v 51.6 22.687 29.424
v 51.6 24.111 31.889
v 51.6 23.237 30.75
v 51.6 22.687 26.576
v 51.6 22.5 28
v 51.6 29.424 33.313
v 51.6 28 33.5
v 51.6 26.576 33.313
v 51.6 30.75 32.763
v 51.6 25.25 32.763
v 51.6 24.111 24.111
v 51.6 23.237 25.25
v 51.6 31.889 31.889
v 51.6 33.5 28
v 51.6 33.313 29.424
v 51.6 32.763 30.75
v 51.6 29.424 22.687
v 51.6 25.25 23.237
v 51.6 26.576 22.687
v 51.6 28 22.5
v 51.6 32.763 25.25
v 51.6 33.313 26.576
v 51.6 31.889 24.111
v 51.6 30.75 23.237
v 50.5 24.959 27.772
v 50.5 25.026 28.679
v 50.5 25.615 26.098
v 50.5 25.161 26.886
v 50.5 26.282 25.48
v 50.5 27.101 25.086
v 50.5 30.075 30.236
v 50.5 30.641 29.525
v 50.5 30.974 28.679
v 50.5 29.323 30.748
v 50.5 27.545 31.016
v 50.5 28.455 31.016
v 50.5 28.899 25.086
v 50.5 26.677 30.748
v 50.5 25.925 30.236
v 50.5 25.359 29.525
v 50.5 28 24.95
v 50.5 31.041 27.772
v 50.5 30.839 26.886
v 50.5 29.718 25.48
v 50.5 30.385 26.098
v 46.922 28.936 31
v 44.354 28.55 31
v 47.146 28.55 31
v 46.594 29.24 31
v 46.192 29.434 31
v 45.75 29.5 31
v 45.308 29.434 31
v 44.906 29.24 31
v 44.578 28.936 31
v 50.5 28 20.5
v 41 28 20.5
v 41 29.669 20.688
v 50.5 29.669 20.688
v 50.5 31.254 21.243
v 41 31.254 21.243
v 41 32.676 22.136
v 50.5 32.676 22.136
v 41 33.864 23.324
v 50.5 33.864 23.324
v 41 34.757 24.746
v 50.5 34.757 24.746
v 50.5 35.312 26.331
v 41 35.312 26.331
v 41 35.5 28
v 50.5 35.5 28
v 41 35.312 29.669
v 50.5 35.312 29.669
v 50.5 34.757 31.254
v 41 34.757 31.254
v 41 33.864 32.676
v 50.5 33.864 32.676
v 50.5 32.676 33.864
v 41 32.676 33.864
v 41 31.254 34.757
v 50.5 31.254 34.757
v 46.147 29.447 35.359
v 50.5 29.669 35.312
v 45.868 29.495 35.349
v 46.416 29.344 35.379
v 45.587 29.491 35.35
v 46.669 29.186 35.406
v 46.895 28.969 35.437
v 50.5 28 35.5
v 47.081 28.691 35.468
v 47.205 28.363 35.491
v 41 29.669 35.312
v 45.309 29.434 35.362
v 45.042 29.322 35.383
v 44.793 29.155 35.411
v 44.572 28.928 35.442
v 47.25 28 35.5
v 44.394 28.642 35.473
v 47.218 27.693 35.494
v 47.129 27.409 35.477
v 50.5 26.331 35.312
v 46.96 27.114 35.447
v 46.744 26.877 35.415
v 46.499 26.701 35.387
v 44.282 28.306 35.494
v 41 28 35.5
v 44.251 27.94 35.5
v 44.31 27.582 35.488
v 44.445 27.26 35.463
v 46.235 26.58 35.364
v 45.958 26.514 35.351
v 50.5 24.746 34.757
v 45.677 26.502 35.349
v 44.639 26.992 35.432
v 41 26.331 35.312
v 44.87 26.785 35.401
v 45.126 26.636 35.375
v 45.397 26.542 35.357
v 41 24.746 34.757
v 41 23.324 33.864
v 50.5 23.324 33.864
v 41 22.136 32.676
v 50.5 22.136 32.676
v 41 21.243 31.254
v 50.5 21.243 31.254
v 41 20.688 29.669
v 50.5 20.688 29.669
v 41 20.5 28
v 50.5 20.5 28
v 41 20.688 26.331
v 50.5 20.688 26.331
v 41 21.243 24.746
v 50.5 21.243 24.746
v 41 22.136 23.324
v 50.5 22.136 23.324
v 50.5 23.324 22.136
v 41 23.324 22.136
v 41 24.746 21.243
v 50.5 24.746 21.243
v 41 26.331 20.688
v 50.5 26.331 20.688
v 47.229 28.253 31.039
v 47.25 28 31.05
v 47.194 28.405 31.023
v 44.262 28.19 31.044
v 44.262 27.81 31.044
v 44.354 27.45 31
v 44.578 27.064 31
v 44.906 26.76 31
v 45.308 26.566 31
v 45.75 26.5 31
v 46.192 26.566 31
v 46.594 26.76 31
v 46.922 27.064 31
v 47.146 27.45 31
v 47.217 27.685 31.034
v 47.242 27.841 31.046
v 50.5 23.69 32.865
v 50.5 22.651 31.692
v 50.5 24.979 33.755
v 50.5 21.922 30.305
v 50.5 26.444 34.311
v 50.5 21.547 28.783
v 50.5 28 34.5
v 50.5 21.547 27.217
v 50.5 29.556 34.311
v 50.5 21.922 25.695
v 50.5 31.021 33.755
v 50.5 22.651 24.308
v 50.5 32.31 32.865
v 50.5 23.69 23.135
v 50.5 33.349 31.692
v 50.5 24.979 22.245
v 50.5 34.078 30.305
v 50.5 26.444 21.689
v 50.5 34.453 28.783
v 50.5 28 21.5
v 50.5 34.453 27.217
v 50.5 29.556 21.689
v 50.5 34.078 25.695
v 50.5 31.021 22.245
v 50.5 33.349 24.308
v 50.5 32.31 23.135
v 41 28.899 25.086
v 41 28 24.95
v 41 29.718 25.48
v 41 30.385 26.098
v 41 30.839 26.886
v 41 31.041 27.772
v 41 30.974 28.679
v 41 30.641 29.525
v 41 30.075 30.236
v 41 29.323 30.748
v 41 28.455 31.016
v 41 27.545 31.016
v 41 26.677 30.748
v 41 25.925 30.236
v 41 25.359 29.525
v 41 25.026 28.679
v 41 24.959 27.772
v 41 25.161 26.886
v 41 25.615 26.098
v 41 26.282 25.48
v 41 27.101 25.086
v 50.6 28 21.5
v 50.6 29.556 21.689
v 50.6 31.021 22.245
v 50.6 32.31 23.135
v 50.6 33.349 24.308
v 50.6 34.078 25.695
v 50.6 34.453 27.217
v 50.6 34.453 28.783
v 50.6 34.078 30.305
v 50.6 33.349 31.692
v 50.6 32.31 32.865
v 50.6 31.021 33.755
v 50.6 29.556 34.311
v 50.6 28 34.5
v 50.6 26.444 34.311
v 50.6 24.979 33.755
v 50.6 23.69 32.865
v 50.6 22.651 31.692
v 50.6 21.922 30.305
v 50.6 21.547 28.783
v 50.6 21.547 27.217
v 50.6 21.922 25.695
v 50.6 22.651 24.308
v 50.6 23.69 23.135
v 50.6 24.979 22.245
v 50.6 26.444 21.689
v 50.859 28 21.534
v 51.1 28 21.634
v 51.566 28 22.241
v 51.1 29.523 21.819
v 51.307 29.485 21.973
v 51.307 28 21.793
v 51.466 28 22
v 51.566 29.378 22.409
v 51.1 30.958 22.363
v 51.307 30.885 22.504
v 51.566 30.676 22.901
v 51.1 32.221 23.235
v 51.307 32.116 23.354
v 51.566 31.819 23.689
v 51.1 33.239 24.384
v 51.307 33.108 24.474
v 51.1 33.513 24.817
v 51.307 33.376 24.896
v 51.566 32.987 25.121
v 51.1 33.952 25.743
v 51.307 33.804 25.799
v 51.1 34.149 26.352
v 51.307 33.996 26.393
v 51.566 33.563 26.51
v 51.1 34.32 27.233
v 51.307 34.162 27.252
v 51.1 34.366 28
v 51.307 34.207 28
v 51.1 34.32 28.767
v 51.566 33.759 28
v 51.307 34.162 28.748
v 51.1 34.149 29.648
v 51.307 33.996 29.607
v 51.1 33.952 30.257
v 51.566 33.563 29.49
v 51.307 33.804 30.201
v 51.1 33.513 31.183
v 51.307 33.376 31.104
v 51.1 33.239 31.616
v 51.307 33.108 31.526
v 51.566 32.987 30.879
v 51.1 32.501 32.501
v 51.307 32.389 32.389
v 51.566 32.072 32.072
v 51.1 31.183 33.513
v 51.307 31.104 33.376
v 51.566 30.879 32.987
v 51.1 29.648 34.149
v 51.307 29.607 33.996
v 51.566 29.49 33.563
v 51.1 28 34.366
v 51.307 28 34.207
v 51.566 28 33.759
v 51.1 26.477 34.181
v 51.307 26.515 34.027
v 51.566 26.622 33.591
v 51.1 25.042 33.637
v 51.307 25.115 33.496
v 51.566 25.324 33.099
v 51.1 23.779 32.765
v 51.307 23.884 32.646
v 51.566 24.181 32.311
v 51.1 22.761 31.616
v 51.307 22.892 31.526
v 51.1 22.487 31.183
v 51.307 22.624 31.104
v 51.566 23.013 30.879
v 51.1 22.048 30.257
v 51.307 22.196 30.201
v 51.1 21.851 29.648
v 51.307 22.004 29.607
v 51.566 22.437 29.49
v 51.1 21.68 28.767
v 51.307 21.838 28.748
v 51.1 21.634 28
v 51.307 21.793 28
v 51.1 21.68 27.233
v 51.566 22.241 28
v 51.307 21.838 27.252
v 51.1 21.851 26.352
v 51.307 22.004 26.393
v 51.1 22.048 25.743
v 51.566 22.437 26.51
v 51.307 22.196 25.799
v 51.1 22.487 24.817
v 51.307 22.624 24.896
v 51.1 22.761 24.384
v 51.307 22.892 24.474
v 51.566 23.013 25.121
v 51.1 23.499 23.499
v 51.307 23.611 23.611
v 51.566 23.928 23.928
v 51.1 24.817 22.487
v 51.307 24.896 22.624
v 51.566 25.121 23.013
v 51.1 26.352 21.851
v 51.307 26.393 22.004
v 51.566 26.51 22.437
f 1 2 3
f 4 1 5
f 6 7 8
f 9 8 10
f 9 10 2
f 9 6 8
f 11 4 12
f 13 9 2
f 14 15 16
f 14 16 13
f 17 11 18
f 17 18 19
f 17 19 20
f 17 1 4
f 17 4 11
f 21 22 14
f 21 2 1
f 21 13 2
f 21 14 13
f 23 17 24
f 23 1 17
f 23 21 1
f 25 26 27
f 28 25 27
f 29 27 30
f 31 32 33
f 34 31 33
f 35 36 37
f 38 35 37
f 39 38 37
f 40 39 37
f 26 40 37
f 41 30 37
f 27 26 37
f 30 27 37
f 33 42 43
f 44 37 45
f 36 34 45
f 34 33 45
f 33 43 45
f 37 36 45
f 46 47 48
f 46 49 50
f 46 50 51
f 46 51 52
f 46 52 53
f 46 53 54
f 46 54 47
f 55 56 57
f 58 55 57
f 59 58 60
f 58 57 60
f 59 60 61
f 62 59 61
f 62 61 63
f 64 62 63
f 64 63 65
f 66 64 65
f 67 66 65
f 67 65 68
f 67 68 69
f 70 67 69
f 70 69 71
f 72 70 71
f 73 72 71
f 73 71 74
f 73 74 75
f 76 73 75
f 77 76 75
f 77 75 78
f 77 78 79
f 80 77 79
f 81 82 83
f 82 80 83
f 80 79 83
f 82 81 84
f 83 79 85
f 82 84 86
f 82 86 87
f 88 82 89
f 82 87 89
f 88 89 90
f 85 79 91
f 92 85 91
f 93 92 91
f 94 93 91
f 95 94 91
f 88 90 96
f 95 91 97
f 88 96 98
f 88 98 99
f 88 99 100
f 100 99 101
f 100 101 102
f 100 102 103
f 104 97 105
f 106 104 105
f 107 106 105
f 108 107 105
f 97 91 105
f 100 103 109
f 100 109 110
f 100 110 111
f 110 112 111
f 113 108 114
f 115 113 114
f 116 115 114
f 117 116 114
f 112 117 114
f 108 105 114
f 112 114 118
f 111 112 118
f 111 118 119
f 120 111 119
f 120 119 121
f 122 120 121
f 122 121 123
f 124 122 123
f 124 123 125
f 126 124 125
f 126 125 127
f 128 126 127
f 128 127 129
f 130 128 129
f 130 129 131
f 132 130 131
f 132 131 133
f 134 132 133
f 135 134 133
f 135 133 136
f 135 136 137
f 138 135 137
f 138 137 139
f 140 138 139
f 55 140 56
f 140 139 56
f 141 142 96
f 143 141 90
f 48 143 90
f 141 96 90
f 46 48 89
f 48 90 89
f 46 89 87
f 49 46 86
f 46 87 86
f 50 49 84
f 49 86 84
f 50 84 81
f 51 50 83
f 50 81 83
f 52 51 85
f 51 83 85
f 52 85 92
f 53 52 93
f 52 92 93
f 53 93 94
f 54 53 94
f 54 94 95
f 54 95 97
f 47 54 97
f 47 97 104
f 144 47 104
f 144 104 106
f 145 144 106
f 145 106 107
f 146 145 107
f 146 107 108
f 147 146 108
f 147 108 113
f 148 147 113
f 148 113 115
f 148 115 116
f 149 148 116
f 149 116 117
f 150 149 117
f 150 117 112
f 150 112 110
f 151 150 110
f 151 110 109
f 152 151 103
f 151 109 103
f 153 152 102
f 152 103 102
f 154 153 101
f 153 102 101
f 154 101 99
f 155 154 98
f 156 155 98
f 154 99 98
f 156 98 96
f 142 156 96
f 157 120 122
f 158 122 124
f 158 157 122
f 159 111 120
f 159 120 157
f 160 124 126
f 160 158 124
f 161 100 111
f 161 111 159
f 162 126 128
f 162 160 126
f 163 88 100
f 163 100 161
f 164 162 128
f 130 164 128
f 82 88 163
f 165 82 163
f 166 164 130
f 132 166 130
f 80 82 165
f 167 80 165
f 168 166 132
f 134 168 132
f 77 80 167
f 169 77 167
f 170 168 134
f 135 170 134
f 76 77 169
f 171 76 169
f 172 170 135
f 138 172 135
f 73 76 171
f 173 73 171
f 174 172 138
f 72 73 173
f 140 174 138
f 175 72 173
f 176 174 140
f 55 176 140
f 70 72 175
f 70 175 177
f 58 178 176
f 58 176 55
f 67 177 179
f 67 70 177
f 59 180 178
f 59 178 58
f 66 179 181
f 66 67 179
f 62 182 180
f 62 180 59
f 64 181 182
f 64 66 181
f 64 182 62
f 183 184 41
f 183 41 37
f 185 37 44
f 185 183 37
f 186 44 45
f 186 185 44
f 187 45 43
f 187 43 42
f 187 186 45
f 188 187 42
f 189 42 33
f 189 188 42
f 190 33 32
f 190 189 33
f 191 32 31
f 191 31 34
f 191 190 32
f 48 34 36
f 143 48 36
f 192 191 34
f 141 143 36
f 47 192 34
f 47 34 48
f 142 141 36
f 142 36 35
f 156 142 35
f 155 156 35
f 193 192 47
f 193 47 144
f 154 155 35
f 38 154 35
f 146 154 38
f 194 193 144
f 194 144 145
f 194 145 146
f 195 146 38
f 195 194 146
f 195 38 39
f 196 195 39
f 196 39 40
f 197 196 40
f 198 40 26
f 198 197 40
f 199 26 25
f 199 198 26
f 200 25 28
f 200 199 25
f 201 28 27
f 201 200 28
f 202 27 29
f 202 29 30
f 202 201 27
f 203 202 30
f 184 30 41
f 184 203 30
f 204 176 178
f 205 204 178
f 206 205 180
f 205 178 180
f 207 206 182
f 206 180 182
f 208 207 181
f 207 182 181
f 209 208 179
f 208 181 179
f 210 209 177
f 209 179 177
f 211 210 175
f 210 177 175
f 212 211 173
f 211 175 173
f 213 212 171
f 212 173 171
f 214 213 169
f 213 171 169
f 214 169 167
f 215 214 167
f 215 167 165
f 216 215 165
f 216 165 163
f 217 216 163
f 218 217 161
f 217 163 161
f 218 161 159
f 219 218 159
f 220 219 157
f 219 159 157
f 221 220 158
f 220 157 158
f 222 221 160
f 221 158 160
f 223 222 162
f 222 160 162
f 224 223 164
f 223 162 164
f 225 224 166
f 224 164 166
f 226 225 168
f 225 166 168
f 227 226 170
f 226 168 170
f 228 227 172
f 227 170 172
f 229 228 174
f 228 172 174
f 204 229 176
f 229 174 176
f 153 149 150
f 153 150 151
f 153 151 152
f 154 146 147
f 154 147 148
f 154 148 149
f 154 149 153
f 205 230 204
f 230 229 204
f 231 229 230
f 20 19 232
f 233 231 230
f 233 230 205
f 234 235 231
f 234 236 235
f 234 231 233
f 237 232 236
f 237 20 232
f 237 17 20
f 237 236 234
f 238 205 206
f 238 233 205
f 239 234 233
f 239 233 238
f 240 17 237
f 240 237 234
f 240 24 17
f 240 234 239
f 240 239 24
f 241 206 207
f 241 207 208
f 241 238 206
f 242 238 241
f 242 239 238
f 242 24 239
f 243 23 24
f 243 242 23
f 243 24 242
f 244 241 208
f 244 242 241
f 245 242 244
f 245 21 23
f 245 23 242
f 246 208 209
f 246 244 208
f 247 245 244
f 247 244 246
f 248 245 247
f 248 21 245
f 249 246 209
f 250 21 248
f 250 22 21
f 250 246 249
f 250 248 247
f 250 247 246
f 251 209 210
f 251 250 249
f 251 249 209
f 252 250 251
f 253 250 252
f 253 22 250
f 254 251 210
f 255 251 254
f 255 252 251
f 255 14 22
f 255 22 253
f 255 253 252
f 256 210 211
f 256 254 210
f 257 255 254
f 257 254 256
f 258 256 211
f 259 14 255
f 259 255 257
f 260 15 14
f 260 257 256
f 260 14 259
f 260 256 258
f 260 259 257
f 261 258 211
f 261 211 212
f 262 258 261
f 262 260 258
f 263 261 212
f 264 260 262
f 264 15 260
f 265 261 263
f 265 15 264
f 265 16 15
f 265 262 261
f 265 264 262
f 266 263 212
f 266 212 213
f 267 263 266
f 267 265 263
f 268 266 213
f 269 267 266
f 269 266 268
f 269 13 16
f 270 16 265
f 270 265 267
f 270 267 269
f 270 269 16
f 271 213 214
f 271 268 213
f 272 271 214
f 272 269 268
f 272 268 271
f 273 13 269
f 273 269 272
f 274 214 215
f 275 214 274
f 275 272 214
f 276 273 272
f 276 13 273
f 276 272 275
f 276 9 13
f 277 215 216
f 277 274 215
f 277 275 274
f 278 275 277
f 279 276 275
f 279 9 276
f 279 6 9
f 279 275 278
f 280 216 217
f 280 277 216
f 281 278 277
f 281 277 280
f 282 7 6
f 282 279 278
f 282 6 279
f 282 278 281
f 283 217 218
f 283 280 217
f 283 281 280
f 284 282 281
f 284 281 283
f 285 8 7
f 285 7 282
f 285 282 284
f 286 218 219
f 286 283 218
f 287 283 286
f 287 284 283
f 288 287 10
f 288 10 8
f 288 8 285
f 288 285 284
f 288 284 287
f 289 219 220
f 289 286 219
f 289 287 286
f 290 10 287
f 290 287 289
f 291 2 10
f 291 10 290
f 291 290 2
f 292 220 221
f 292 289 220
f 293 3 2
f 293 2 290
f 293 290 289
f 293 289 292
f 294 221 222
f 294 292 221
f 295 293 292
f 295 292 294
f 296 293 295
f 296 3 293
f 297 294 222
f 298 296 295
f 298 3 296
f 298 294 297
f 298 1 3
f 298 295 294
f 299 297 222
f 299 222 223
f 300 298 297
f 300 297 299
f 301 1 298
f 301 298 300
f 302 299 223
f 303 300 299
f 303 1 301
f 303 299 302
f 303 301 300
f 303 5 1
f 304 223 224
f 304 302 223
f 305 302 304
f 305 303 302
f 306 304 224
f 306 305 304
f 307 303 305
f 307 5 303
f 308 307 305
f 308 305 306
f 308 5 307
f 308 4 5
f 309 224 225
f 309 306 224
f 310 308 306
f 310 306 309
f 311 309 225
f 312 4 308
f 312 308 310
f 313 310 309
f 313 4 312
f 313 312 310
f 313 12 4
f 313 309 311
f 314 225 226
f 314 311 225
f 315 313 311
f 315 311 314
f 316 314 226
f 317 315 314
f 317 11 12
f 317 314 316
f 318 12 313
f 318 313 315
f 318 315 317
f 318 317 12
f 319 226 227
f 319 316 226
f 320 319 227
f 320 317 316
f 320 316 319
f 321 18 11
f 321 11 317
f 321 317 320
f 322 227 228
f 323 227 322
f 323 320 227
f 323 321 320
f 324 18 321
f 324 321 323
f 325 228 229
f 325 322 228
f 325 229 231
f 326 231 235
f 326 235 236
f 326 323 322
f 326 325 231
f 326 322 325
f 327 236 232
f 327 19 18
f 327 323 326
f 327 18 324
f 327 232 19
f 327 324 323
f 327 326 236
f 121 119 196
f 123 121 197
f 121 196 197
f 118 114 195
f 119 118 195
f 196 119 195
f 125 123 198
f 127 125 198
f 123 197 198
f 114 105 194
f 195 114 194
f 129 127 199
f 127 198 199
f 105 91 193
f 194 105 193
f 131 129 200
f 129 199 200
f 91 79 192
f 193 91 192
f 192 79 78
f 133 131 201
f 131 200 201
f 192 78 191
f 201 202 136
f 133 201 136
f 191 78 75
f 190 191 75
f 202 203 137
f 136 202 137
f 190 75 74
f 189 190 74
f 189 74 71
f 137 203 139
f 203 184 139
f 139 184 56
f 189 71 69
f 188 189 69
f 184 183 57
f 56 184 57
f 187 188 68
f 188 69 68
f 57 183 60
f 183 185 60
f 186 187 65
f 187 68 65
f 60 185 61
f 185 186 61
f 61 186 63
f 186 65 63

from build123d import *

# Parameters (mm, degrees)
SKETCH010_R             = 7.5
SKETCH010_R_2           = 3.05
PAD002_DEPTH            = 9.5
SKETCH009_R             = 6.5
PAD003_DEPTH            = 1.1
FILLET001_R             = 1
SKETCH011_R             = 1.5
POCKET001_DEPTH         = 5
BODY001_PLACEMENT_ANGLE = 90


with BuildPart() as part:
    # Sketch010 → Pad002 (new body)
    with BuildSketch(Plane.XY):
        Circle(SKETCH010_R)
        Circle(SKETCH010_R_2, mode=Mode.SUBTRACT)
    extrude(amount=PAD002_DEPTH)

    # Sketch009 (on Face4 of Pad002) → Pad003 (join)
    with BuildSketch(Plane.XY.offset(9.5)):
        Circle(SKETCH009_R)
    extrude(amount=PAD003_DEPTH)

    # Fillet001
    fillet001_edges = [part.edges().sort_by_distance(p)[0] for p in [
        (-6.5, 0, 10.6),
    ]]
    fillet(fillet001_edges, radius=FILLET001_R)

    # Sketch011 (on DatumPlane) → Pocket001 (cut)
    with BuildSketch(Plane(origin=(-8, 0, 4.75), x_dir=(0, 0, 1), z_dir=(-1, 0, 0))):
        Circle(SKETCH011_R)
    extrude(amount=-POCKET001_DEPTH, mode=Mode.SUBTRACT)


with BuildPart() as part_1:
    # Body001 placement: moved
    add(part.part.moved(Location((41, 28, 28))).rotate(Axis((41, 28, 28), (0, 1, 0)), BODY001_PLACEMENT_ANGLE))


solid = part_1.part
